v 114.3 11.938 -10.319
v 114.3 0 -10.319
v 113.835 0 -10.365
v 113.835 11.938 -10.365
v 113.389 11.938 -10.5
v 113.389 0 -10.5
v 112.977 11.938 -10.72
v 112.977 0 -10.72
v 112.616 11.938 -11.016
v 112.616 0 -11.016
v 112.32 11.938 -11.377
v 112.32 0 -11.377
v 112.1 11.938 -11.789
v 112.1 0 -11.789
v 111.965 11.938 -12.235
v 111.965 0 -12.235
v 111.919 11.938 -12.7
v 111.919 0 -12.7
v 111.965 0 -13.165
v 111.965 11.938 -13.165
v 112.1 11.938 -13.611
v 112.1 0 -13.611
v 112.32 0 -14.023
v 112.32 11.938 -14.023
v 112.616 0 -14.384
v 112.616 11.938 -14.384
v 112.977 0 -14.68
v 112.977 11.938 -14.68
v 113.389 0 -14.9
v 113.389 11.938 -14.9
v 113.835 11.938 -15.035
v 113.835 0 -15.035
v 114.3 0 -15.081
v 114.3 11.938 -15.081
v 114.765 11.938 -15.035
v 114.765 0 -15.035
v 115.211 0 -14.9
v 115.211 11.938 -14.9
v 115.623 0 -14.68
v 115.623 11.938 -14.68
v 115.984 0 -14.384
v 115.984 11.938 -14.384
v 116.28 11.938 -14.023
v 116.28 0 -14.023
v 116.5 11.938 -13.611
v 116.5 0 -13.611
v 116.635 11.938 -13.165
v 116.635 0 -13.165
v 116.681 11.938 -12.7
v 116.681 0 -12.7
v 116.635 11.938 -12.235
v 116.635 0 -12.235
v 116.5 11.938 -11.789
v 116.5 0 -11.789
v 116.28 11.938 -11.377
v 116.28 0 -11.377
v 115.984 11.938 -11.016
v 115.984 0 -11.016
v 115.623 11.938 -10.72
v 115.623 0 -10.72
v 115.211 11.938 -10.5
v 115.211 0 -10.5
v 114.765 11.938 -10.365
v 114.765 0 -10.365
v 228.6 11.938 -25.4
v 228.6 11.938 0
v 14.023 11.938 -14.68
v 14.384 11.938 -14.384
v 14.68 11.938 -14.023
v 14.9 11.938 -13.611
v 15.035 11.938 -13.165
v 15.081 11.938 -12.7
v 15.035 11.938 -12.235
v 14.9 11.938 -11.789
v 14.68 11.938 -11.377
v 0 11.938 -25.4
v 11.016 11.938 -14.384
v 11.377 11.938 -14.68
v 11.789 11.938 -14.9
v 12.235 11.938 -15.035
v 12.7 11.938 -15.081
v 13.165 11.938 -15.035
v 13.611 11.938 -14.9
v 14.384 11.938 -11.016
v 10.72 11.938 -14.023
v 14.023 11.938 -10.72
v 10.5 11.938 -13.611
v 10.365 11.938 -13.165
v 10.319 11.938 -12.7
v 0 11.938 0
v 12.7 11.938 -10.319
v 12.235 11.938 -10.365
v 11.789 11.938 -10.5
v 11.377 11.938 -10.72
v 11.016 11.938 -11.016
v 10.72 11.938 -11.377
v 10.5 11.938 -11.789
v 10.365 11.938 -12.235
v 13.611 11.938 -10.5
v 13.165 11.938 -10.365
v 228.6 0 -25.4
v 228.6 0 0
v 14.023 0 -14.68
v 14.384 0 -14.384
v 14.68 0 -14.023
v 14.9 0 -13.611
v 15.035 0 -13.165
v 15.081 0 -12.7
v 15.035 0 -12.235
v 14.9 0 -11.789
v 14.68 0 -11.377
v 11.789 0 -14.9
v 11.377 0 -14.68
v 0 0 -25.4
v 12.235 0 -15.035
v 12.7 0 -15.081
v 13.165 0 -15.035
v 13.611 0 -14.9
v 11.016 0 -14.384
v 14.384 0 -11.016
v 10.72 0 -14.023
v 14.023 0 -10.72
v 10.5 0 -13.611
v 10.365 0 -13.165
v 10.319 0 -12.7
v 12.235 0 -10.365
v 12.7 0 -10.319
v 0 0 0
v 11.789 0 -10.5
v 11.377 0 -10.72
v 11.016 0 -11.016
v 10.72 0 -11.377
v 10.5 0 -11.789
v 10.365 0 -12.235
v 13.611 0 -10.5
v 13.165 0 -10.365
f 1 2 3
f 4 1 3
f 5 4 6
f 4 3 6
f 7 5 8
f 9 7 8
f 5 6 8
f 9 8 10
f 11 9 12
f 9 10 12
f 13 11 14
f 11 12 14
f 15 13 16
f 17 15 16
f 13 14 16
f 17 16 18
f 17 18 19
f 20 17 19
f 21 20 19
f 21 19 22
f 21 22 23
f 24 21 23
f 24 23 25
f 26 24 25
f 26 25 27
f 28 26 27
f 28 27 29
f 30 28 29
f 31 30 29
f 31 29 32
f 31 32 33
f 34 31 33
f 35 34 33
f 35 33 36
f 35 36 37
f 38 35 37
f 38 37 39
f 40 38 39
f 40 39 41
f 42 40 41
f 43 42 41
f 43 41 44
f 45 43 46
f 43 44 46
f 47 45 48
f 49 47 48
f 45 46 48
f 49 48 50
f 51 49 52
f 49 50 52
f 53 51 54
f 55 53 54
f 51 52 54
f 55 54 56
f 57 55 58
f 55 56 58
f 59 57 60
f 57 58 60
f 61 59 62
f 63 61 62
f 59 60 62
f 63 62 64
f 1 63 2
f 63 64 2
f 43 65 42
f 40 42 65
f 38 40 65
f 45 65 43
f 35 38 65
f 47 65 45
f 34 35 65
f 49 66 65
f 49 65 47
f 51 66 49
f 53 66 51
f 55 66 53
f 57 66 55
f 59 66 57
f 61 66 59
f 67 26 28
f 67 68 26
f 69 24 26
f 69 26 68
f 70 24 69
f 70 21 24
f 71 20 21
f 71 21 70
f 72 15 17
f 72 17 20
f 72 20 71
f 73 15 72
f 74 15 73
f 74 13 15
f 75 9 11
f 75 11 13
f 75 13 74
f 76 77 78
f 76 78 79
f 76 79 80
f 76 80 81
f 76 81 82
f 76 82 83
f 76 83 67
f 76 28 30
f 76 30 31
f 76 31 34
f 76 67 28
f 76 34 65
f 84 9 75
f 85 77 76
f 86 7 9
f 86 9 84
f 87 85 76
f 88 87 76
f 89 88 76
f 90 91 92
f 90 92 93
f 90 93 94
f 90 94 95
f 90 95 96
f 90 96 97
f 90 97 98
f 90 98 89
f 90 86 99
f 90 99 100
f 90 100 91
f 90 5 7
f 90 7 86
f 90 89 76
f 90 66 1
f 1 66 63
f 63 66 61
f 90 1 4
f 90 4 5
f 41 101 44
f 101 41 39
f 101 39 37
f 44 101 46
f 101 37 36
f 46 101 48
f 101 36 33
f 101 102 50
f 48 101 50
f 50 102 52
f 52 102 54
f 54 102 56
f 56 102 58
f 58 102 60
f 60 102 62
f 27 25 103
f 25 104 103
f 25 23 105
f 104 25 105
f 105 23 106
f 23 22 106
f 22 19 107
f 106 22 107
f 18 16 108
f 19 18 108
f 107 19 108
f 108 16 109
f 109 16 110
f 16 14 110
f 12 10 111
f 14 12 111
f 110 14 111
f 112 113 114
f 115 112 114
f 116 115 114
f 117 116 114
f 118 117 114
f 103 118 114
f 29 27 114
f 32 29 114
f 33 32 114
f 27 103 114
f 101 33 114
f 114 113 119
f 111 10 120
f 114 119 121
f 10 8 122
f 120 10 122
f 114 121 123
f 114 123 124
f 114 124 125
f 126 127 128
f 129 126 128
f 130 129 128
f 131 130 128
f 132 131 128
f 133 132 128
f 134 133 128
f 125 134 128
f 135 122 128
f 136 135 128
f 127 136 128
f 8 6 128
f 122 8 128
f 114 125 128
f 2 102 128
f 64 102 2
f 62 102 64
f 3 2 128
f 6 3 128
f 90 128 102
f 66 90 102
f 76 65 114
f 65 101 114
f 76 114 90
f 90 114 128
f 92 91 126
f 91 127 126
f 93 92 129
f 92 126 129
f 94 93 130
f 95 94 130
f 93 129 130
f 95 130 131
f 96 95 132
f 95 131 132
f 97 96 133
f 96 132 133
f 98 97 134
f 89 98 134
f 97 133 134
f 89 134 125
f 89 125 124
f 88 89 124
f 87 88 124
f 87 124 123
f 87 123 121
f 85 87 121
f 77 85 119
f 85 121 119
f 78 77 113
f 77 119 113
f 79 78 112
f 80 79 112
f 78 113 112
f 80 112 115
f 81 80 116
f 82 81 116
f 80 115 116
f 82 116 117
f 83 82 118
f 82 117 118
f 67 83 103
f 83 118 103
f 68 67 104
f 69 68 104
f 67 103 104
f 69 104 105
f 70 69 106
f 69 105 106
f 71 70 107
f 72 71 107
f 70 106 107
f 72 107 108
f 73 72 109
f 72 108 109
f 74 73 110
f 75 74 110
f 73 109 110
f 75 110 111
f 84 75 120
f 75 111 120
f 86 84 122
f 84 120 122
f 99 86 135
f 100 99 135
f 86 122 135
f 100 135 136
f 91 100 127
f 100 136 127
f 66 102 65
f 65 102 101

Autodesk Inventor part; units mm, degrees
ref_plane "YZ Plane" through (0, 0, 0) normal (1, 0, 0) x (0, 1, 0)
ref_plane "XZ Plane" through (0, 0, 0) normal (0, 1, 0) x (-1, 0, 0)
ref_plane "XY Plane" through (0, 0, 0) normal (0, 0, 1) x (1, 0, 0)
sketch "Sketch1" plane through (0, 0, 0) normal (0, 1, 0) x (-1, 0, 0)
  line L0 (0, 0) -> (-228.6, 0)
  line L1 (-228.6, 0) -> (-228.6, -25.4)
  line L2 (-228.6, -25.4) -> (0, -25.4)
  line L3 (0, -25.4) -> (0, 0)
  dimension "d0" = 228.6
  dimension "d1" = 25.4
extrude "Extrusion1" add sketch "Sketch1" along normal blind 11.938
sketch "Sketch4" plane through (0, 11.938, 0) normal (0, 1, 0) x (1, 0, 0)
  line L0 (228.6, 25.4) -> (0, 25.4) projected
  line L1 (114.3, 25.4) -> (114.3, 0) construction
  line L2 (0, 0) -> (228.6, 0) projected
  circle A0 centre (114.3, 12.7) radius 2.3812
  line L3 (0, 25.4) -> (0, 0) projected
  line L4 (0, 12.7) -> (12.7, 12.7)
  line L5 (0, 12.7) -> (12.7, 12.7) construction
  circle A1 centre (12.7, 12.7) radius 2.3812
  dimension "d40" = 12.7
  dimension "d42" = 4.7625
hole "Hole3" at (114.3, 11.938, -12.7) at (12.7, 11.938, -12.7) direction (0, -1, 0) diameter 4.7625 end through all
properties part number "track"
